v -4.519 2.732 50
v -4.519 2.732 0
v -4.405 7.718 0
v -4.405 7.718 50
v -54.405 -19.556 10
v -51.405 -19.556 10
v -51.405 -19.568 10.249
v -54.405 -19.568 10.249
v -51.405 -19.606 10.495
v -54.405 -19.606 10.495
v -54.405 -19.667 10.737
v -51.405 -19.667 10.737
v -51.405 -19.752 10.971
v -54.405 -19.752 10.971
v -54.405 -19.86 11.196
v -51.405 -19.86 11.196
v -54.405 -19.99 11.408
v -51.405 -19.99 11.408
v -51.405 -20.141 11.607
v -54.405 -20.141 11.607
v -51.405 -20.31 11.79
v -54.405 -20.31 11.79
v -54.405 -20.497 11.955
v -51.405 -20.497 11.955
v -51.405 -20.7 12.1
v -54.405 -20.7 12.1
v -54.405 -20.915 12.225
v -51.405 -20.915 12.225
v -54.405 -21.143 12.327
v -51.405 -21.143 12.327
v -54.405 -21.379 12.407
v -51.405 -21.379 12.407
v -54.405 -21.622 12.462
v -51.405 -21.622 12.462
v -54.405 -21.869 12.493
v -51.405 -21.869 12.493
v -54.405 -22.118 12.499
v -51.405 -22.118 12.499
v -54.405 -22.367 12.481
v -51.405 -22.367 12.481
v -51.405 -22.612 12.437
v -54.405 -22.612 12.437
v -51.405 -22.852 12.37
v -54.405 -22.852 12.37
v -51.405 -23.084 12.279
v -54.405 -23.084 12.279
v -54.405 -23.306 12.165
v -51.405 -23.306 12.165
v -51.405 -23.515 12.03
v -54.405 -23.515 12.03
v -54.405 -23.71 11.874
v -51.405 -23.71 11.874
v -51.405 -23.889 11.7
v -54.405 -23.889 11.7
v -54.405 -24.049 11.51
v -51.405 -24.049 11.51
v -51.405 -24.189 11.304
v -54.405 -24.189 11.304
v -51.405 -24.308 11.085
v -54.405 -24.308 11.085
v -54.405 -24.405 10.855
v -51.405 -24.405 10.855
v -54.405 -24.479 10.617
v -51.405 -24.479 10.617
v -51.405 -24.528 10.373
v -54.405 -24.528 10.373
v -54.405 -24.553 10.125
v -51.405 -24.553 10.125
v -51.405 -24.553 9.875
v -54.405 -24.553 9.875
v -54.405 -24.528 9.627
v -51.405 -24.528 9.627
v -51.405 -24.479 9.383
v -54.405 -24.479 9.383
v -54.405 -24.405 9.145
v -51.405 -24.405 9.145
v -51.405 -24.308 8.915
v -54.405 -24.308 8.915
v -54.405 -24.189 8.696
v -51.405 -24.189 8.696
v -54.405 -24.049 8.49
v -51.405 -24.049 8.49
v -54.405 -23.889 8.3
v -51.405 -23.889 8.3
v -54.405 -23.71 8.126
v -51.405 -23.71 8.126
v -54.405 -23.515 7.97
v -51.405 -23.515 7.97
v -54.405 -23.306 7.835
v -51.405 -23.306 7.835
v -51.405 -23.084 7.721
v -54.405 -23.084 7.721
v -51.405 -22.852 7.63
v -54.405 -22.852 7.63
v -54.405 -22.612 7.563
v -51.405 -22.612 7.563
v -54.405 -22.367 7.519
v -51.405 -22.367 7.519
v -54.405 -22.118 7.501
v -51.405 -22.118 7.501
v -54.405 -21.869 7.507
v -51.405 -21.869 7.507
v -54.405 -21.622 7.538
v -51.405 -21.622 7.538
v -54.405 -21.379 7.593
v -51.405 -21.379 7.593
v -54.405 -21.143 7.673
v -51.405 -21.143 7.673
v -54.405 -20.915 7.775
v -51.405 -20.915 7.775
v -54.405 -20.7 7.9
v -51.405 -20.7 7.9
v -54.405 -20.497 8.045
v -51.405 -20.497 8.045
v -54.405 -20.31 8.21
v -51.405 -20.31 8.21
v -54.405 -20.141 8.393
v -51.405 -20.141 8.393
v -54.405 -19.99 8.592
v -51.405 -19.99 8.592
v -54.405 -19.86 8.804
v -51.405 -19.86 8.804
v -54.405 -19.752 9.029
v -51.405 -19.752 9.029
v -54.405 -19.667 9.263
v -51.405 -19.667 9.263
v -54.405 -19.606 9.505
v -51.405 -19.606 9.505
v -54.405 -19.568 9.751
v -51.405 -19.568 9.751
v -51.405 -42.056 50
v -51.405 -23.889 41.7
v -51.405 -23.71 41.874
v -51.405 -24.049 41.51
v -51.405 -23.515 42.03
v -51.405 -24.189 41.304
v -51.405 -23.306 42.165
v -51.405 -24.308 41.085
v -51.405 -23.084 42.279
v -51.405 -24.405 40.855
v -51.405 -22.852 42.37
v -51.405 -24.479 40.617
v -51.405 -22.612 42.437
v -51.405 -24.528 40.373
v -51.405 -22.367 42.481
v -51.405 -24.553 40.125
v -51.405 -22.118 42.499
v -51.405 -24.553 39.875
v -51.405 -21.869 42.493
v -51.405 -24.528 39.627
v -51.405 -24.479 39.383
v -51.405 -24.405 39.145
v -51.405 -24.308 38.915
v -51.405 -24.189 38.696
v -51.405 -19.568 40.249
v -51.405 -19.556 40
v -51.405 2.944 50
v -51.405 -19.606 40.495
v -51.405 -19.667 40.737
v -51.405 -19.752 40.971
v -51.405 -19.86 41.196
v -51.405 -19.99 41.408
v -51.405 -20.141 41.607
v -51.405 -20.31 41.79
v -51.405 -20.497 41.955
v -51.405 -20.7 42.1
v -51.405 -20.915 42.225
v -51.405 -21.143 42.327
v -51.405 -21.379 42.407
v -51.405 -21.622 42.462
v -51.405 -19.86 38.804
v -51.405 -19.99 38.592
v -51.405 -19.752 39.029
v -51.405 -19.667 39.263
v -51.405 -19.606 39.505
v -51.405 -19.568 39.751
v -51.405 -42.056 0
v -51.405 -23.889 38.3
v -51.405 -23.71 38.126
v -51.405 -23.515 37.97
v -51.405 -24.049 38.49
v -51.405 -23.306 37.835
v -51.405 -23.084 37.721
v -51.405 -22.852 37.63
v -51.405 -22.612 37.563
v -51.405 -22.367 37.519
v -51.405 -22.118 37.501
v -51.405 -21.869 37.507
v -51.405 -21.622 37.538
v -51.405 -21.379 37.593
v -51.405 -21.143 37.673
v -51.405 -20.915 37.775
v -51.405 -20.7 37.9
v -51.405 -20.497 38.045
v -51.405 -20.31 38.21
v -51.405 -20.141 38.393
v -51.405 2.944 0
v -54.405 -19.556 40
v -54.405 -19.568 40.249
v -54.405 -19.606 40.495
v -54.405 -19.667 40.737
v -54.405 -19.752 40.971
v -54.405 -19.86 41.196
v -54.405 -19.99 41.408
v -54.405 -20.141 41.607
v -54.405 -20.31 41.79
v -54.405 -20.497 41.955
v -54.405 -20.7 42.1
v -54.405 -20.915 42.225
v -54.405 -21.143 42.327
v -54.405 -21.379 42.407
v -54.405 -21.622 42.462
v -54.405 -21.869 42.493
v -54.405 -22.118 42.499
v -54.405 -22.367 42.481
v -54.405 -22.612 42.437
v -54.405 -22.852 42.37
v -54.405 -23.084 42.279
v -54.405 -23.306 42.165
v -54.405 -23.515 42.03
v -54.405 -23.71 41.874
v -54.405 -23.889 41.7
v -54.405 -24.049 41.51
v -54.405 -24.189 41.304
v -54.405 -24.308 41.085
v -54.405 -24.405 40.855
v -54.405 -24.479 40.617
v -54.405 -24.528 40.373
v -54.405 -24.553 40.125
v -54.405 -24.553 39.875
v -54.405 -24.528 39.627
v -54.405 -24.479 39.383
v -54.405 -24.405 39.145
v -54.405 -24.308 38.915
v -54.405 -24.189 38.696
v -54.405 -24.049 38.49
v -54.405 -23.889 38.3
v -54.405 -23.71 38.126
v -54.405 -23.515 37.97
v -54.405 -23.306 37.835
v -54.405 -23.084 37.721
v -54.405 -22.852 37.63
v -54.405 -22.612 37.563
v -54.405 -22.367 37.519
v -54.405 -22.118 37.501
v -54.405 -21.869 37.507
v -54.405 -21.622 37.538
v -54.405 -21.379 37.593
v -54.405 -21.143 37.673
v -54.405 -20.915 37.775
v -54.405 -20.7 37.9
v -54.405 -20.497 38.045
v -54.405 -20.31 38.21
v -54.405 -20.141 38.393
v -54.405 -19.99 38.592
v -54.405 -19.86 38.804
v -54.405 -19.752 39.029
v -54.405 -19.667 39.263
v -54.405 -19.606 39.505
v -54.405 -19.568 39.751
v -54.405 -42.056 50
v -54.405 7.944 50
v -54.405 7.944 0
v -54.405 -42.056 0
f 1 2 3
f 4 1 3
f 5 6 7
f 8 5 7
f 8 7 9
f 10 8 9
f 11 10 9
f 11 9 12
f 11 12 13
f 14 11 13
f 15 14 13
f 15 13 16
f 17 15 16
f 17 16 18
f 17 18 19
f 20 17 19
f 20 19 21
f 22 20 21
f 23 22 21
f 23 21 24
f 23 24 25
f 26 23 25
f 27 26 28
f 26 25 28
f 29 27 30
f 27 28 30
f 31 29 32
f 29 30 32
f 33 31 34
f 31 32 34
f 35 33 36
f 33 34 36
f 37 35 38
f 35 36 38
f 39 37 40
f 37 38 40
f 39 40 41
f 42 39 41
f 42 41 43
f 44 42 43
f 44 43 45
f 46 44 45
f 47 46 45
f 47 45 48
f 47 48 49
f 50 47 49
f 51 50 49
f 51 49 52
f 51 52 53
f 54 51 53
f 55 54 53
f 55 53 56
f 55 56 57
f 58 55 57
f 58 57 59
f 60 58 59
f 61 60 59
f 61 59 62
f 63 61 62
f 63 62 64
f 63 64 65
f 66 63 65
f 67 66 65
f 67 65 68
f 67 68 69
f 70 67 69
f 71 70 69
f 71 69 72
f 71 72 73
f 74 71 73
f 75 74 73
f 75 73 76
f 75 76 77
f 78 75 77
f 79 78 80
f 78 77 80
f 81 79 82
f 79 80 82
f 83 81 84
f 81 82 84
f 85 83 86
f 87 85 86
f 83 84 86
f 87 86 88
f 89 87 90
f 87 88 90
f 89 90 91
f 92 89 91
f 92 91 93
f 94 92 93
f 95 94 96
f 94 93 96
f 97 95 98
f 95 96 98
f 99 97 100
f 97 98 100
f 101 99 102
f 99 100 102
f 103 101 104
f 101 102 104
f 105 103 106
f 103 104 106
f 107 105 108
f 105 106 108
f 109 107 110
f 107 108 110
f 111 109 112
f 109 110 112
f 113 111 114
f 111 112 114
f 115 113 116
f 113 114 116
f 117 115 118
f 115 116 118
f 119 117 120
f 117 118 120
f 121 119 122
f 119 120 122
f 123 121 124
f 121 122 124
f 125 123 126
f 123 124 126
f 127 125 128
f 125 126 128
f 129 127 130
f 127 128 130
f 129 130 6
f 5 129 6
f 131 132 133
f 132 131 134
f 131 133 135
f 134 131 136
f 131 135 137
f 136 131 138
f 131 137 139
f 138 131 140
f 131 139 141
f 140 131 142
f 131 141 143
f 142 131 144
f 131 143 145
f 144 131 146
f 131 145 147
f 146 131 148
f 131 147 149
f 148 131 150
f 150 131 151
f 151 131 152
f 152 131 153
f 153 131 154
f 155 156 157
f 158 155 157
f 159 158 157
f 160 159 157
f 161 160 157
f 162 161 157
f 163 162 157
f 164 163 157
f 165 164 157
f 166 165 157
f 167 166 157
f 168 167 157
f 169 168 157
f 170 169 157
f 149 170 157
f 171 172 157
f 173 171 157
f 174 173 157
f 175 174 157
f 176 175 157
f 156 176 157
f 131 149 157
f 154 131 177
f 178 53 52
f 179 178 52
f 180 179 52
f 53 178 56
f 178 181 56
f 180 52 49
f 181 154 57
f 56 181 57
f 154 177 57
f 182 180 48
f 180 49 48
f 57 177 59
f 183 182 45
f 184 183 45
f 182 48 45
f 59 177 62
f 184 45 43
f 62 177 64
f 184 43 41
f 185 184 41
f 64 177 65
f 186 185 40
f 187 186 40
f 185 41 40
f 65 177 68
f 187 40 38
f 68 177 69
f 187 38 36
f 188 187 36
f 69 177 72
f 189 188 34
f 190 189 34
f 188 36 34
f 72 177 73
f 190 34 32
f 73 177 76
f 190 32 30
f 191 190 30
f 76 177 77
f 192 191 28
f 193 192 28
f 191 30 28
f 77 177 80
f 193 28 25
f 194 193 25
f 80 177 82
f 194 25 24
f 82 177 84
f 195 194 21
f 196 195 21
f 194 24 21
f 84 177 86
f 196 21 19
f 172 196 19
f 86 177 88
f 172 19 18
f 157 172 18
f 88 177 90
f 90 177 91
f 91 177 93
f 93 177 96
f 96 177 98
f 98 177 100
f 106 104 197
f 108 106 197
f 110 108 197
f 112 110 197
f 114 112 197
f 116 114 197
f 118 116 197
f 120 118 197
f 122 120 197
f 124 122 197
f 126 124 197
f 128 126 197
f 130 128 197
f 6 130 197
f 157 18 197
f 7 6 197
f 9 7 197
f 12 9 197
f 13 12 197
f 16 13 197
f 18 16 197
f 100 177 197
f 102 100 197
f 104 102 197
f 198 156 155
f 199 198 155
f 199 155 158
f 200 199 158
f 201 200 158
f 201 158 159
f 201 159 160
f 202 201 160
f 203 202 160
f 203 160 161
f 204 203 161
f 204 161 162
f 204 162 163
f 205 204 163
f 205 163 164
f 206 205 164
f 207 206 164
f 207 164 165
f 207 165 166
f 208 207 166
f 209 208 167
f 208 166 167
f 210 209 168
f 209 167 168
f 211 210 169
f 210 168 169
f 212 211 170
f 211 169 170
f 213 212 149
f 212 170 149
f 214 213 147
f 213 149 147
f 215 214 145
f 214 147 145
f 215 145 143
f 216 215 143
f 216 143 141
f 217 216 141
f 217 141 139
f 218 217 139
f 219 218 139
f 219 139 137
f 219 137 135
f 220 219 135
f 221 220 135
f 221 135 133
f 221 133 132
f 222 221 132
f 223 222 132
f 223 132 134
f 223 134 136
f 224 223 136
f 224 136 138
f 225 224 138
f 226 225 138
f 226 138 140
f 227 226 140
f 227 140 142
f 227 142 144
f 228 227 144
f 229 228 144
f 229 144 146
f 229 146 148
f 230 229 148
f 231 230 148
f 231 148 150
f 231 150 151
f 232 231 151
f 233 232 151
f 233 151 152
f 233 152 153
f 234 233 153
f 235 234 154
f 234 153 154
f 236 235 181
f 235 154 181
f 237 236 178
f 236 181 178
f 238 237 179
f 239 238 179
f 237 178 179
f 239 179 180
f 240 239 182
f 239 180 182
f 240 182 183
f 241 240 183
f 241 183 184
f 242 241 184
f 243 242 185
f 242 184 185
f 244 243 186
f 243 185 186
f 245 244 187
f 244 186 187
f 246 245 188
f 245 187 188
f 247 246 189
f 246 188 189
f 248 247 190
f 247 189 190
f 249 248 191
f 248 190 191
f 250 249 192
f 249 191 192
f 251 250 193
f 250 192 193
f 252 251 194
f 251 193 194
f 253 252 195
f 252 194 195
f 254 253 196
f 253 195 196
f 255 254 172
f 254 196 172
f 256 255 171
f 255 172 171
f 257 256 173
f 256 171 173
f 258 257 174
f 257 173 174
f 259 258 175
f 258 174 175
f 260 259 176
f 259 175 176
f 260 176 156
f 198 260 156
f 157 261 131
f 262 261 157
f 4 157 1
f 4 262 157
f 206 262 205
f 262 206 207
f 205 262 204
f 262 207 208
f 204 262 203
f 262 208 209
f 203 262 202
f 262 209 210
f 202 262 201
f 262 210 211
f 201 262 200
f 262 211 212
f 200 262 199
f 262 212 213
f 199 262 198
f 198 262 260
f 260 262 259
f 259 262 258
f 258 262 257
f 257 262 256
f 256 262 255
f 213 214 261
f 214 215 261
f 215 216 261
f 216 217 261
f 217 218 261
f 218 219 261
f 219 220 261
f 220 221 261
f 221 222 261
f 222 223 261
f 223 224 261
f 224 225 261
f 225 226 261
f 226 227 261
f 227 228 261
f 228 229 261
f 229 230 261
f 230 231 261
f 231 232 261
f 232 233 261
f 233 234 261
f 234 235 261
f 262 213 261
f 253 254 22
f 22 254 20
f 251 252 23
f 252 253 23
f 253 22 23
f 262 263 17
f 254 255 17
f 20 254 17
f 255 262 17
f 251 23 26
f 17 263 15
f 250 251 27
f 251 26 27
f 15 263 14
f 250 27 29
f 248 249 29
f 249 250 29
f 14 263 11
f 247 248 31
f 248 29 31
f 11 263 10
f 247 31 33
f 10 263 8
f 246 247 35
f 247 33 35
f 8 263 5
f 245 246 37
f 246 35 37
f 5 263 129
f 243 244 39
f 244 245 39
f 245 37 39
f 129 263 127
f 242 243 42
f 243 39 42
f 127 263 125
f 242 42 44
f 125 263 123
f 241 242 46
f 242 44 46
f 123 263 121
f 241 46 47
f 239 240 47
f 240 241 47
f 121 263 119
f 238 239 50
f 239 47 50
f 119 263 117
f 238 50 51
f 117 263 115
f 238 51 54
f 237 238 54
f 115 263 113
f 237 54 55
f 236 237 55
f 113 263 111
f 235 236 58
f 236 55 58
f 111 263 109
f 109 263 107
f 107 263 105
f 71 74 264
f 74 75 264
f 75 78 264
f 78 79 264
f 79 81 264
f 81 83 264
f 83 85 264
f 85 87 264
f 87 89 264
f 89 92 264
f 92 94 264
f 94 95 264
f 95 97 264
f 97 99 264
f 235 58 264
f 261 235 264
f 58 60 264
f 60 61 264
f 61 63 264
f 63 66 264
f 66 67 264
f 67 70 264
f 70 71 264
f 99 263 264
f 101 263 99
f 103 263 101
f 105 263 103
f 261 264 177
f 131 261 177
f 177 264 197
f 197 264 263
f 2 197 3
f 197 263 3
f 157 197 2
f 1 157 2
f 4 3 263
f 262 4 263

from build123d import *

# Parameters (mm, degrees)
F1_DEPTH = 50
F2_R     = 2.5
F3_DEPTH = 93


with BuildPart() as f1:
    # F0 (on Top) → F1 (new body)
    with BuildSketch(Plane.XY):
        Polygon((-4.405333, 7.717764), (-54.404821, 7.944006), (-54.404821, -42.055994), (-51.404821, -42.055994), (-51.404821, 2.944006), (-4.519233, 2.731854), align=None)
    extrude(amount=F1_DEPTH)

    # F2 (on Right) → F3 (cut)
    with BuildSketch(Plane.YZ):
        with Locations((-22.055994, 40)):
            Circle(F2_R)
        with Locations((-22.055994, 10)):
            Circle(F2_R)
    extrude(amount=-F3_DEPTH, mode=Mode.SUBTRACT)


solid = f1.part
